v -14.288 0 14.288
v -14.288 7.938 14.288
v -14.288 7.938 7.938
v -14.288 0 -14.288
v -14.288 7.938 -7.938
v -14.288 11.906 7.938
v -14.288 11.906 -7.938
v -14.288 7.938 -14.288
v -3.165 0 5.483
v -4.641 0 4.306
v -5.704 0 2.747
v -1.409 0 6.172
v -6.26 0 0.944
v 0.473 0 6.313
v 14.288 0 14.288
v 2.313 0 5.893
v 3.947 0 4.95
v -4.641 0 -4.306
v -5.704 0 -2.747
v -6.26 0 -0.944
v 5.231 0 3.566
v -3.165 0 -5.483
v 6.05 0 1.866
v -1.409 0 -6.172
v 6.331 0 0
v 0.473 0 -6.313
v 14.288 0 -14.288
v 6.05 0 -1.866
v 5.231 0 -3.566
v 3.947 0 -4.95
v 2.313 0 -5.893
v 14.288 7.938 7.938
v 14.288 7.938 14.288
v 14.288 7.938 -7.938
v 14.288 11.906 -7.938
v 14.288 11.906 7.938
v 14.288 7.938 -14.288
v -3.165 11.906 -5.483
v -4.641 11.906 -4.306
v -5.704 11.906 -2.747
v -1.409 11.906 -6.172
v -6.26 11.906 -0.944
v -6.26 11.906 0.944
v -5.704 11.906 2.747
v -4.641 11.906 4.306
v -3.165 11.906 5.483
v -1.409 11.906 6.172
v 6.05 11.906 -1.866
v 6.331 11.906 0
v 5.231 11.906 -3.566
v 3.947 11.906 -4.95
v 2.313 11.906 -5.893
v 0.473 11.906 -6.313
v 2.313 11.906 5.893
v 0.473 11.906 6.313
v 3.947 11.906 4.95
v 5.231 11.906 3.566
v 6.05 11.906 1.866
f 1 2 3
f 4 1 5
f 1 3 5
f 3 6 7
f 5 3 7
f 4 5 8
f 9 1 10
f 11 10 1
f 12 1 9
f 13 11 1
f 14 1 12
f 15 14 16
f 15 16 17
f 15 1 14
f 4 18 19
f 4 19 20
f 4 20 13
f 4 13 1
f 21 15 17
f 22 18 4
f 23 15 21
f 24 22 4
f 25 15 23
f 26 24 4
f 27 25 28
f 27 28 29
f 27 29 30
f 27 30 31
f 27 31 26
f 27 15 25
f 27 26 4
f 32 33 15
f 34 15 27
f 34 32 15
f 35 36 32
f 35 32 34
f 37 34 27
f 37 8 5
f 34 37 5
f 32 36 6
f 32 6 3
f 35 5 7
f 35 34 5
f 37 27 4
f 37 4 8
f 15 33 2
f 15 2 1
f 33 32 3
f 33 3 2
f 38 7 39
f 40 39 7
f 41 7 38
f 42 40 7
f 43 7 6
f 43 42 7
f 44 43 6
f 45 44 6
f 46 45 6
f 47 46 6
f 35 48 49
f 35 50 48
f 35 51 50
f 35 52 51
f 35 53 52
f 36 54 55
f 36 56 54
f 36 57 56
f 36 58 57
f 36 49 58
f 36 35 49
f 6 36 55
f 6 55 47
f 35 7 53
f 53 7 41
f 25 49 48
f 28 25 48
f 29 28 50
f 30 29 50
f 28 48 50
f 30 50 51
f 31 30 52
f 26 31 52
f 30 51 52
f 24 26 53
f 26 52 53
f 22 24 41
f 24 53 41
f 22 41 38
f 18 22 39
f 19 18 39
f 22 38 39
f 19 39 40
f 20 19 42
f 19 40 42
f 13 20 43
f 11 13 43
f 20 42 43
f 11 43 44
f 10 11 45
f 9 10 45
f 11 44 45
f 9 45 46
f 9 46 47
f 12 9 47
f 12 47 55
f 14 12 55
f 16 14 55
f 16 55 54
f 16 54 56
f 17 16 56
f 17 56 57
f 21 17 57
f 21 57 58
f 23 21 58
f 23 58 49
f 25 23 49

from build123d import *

# Parameters (mm, degrees)
BOSS_EXTRUDE1_DEPTH = 14.2875
SKETCH2_R           = 6.33095
CUT_EXTRUDE1_DEPTH  = 12.90625


with BuildPart() as part:
    # Sketch1 → Boss-Extrude1 (new body, symmetric)
    with BuildSketch(Plane(origin=(0, 0, 0), x_dir=(0, 0, -1), z_dir=(1, 0, 0))):
        Polygon((7.9375, 11.90625), (-7.9375, 11.90625), (-7.9375, 7.9375), (-14.2875, 7.9375), (-14.2875, 0), (14.2875, 0), (14.2875, 7.9375), (7.9375, 7.9375), align=None)
    extrude(amount=BOSS_EXTRUDE1_DEPTH, both=True)

    # Sketch2 → Cut-Extrude1 (cut, through all)
    with BuildSketch(Plane(origin=(0, 11.90625, 0), x_dir=(1, 0, 0), z_dir=(0, 1, 0))):
        Circle(SKETCH2_R)
    extrude(amount=-CUT_EXTRUDE1_DEPTH, mode=Mode.SUBTRACT)


solid = part.part
